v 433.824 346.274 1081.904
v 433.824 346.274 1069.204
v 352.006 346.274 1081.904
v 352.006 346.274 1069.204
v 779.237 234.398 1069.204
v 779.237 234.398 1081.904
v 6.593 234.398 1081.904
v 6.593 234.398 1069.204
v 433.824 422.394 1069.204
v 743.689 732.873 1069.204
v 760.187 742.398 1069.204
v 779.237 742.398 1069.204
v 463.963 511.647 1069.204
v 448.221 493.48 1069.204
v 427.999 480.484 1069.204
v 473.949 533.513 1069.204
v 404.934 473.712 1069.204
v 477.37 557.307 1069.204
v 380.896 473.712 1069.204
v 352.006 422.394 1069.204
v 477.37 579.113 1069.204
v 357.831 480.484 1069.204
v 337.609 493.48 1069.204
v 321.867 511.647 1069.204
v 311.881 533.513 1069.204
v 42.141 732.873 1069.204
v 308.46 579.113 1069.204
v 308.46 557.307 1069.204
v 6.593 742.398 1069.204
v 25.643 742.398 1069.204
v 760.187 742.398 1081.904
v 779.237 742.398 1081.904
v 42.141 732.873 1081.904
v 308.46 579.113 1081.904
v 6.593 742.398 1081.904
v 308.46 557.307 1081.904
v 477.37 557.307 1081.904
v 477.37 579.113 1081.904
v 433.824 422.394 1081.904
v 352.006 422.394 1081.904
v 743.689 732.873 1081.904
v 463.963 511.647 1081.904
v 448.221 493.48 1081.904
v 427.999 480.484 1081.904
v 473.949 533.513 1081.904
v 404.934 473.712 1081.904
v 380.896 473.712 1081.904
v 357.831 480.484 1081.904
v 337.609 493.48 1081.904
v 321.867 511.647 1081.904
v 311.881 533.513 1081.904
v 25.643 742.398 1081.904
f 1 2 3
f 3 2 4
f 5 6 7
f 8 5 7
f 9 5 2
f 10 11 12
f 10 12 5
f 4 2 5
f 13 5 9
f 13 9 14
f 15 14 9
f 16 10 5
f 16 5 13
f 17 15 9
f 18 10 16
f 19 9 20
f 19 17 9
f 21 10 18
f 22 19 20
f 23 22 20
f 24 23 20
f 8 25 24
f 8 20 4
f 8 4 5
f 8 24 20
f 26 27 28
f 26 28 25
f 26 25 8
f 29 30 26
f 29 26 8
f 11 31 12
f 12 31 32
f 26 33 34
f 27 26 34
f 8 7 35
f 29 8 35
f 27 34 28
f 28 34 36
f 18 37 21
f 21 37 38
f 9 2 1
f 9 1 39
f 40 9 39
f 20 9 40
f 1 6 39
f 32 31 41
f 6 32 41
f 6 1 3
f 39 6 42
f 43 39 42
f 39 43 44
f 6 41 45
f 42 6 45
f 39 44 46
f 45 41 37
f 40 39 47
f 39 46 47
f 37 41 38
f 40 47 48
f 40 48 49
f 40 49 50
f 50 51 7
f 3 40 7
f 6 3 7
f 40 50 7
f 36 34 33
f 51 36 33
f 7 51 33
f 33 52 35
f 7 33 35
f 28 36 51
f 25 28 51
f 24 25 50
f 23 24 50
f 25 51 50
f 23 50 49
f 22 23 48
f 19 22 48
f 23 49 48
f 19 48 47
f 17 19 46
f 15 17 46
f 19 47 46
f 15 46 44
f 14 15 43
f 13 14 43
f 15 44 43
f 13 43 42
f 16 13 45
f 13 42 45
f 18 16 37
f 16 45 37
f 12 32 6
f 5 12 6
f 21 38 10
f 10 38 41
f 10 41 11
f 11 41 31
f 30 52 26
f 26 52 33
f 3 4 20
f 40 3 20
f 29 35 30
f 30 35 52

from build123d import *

# Parameters (mm, degrees)
BOSS_EXTRUDE1_DEPTH = 12.7
SKETCH7_W           = 81.817014572
SKETCH7_H           = 76.120378059
CUT_EXTRUDE5_DEPTH  = 12.7


with BuildPart() as part:
    # Sketch1 → Boss-Extrude1 (new body)
    with BuildSketch(Plane.XY.offset(1081.90385267)):
        with BuildLine():
            Line((477.370001613, 579.113460481), (743.688832794, 732.872709354))
            Line((743.688832794, 732.872709354), (760.186616736, 742.397709354))
            Line((760.186616736, 742.397709354), (779.236616736, 742.397709354))
            Line((779.236616736, 742.397709354), (779.236616736, 234.397709354))
            Line((779.236616736, 234.397709354), (6.593386489, 234.397709354))
            Line((6.593386489, 234.397709354), (6.593386489, 742.397709354))
            Line((6.593386489, 742.397709354), (25.643386489, 742.397709354))
            Line((25.643386489, 742.397709354), (42.141170431, 732.872709354))
            Line((42.141170431, 732.872709354), (308.460001613, 579.113460481))
            Line((308.460001613, 579.113460481), (308.460001613, 557.307056284))
            ThreePointArc((308.460001613, 557.307056284), (392.915001613, 472.852056284), (477.370001613, 557.307056284))
            Line((477.370001613, 557.307056284), (477.370001613, 579.113460481))
        make_face()
    extrude(amount=-BOSS_EXTRUDE1_DEPTH)

    # Sketch7 → Cut-Extrude5 (cut)
    with BuildSketch(Plane(origin=(0, 0, 1069.20385267), x_dir=(-1, 0, 0), z_dir=(0, 0, -1))):
        with Locations((-392.915001613, 384.334045895)):
            Rectangle(SKETCH7_W, SKETCH7_H)
    extrude(amount=-CUT_EXTRUDE5_DEPTH, mode=Mode.SUBTRACT)


solid = part.part
